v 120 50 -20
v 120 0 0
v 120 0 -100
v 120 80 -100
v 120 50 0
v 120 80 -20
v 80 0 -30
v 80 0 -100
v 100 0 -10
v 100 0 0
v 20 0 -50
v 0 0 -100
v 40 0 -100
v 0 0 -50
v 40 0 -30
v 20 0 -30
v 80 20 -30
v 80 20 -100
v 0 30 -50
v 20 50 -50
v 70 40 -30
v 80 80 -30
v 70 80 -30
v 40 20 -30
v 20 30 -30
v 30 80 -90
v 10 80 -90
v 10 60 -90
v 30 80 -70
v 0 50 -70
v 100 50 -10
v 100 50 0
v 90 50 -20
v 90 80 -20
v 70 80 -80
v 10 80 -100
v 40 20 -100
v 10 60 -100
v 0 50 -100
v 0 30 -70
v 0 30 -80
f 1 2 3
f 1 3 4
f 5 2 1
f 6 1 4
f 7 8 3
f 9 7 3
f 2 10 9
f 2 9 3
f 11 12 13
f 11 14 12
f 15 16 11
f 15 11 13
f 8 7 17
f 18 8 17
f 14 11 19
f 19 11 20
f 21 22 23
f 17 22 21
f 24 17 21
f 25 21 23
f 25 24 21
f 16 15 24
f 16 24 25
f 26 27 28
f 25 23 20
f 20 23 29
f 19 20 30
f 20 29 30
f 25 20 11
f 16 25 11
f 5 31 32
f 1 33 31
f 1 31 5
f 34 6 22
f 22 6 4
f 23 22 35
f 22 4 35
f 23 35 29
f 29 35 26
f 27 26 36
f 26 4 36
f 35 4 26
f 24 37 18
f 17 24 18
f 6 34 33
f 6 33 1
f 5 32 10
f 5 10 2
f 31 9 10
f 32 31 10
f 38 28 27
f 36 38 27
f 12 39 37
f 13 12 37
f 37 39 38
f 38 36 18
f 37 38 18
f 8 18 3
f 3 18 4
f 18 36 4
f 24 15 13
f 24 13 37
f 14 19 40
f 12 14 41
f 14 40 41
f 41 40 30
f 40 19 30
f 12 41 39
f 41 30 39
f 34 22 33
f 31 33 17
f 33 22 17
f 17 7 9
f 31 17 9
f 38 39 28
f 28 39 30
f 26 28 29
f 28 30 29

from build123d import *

# Parameters (mm, degrees)
SKETCH1_W                = 120
SKETCH1_H                = 80
BOSS_EXTRUDE1_DEPTH      = 100
SKETCH2_W                = 40
SKETCH2_H                = 20
CUT_EXTRUDE1_DEPTH       = 100
CUT_EXTRUDE2_DEPTH       = 100
SKETCH4_W                = 20
SKETCH4_H                = 50
CUT_EXTRUDE3_DEPTH       = 100
SKETCH5_W                = 60
SKETCH5_H                = 30
CUT_EXTRUDE4_DEPTH       = 100
CUT_EXTRUDE5_DEPTH       = 100
SKETCH7_W                = 30
SKETCH7_H                = 20
CUT_EXTRUDE6_DEPTH       = 30
CUT_EXTRUDE7_DEPTH       = 110
CUT_EXTRUDE8_DEPTH       = 110
CUT_EXTRUDE9_DEPTH       = 110
CUT_EXTRUDE11_DEPTH      = 110
CUT_EXTRUDE12_DEPTH      = 110
CUT_EXTRUDE13_DEPTH      = 110
BOSS_EXTRUDE4_DEPTH      = 50
BOSS_EXTRUDE6_DEPTH      = 40
BOSS_EXTRUDE7_DEPTH      = 40
CUT_EXTRUDE18_DEPTH      = 84
CUT_EXTRUDE18_DEPTH_BACK = 20
CUT_EXTRUDE19_DEPTH      = 20
SKETCH34_W               = 40
SKETCH34_H               = 50
BOSS_EXTRUDE8_DEPTH      = 30
SKETCH35_W               = 20
SKETCH35_H               = 14.142135624
CUT_EXTRUDE20_DEPTH      = 30
SKETCH36_W               = 20
SKETCH36_H               = 30
BOSS_EXTRUDE9_DEPTH      = 30
BOSS_EXTRUDE10_DEPTH     = 30
BOSS_EXTRUDE11_DEPTH     = 30
BOSS_EXTRUDE12_DEPTH     = 30
BOSS_EXTRUDE13_DEPTH     = 30
SKETCH41_W               = 40
SKETCH41_H               = 20
CUT_EXTRUDE21_DEPTH      = 172


with BuildPart() as part:
    # Sketch1 → Boss-Extrude1 (new body)
    with BuildSketch(Plane.XY):
        with Locations((60, 40)):
            Rectangle(SKETCH1_W, SKETCH1_H)
    extrude(amount=-BOSS_EXTRUDE1_DEPTH)

    # Sketch2 → Cut-Extrude1 (cut)
    with BuildSketch(Plane.XY):
        with Locations((60, 10)):
            Rectangle(SKETCH2_W, SKETCH2_H)
    extrude(amount=-CUT_EXTRUDE1_DEPTH, mode=Mode.SUBTRACT)

    # Sketch3 → Cut-Extrude2 (cut)
    with BuildSketch(Plane.XY):
        Polygon((0, 50), (10, 60), (10, 80), (0, 80), align=None)
    extrude(amount=-CUT_EXTRUDE2_DEPTH, mode=Mode.SUBTRACT)

    # Sketch4 → Cut-Extrude3 (cut)
    with BuildSketch(Plane(origin=(0, 0, 0), x_dir=(-1, 0, 0), z_dir=(0, -1, 0))):
        with Locations((-10, 25)):
            Rectangle(SKETCH4_W, SKETCH4_H)
    extrude(amount=-CUT_EXTRUDE3_DEPTH, mode=Mode.SUBTRACT)

    # Sketch5 → Cut-Extrude4 (cut)
    with BuildSketch(Plane(origin=(0, 0, 0), x_dir=(-1, 0, 0), z_dir=(0, -1, 0))):
        with Locations((-50, 15)):
            Rectangle(SKETCH5_W, SKETCH5_H)
    extrude(amount=-CUT_EXTRUDE4_DEPTH, mode=Mode.SUBTRACT)

    # Sketch6 → Cut-Extrude5 (cut)
    with BuildSketch(Plane.XZ):
        Polygon((80, -30), (100, -10), (100, 0), (80, 0), align=None)
    extrude(amount=-CUT_EXTRUDE5_DEPTH, mode=Mode.SUBTRACT)

    # Sketch7 → Cut-Extrude6 (cut)
    with BuildSketch(Plane(origin=(0, 80, 0), x_dir=(1, 0, 0), z_dir=(0, 1, 0))):
        with Locations((105, 10)):
            Rectangle(SKETCH7_W, SKETCH7_H)
    extrude(amount=-CUT_EXTRUDE6_DEPTH, mode=Mode.SUBTRACT)

    # Sketch9 → Cut-Extrude7 (cut)
    with BuildSketch(Plane.XY.offset(-90)):
        Polygon((10, 80), (10, 60), (30, 80), align=None)
    extrude(amount=CUT_EXTRUDE7_DEPTH, mode=Mode.SUBTRACT)

    # Sketch15 → Cut-Extrude8 (cut)
    with BuildSketch(Plane(origin=(6.578947368, -3.947368421, -2.631578947), x_dir=(0.278207442, -0.166924465, 0.945905303), z_dir=(-0.811107106, 0.486664263, 0.324442842))):
        Polygon((-71.221105162, 84.03430672), (-71.221105162, 25.724787771), (-50.077339567, 14.291548762), (-50.077339567, 53.164561394), align=None)
    extrude(amount=CUT_EXTRUDE8_DEPTH, mode=Mode.SUBTRACT)

    # Sketch18 → Cut-Extrude9 (cut)
    with BuildSketch(Plane(origin=(12.371134021, -10.309278351, -12.371134021), x_dir=(-0.468006318, 0.390005265, -0.793010706), z_dir=(0.609207699, -0.507673083, -0.609207699))):
        Polygon((72.670981065, 80.663234358), (22.230300111, 106.270610344), (22.230300111, 28.168113585), align=None)
    extrude(amount=-CUT_EXTRUDE9_DEPTH, mode=Mode.SUBTRACT)

    # Sketch19 → Cut-Extrude11 (cut)
    with BuildSketch(Plane(origin=(11.193675889, -9.328063241, -7.928853755), x_dir=(0.367189278, -0.305991065, 0.878374352), z_dir=(-0.674785869, 0.562321557, 0.477973324))):
        Polygon((-25.127266295, 106.270610344), (-70.665936585, 106.270610344), (-70.665936585, 23.046638388), (-25.127266295, 28.168113585), align=None)
    extrude(amount=CUT_EXTRUDE11_DEPTH, mode=Mode.SUBTRACT)

    # Sketch20 → Cut-Extrude12 (cut)
    with BuildSketch(Plane(origin=(18.330133634, 24.566158479, -3.023527197), x_dir=(0.803624389, -0.590679852, 0.072699059), z_dir=(0.595136826, 0.797606055, -0.098166899))):
        Polygon((-14.663450209, 46.256870976), (-22.809329684, 65.811114724), (-10.365705355, 46.571670512), align=None)
    extrude(amount=-CUT_EXTRUDE12_DEPTH, mode=Mode.SUBTRACT)

    # Sketch23 → Cut-Extrude13 (cut)
    with BuildSketch(Plane.XY.offset(-70)):
        Polygon((0, 30), (0, 80), (41.666666667, 80), align=None)
    extrude(amount=CUT_EXTRUDE13_DEPTH, mode=Mode.SUBTRACT)

    # Sketch27 → Boss-Extrude4 (add)
    with BuildSketch(Plane.XY.offset(-30)):
        Polygon((20, 20), (70, 80), (20, 30), align=None)
    extrude(amount=-BOSS_EXTRUDE4_DEPTH)

    # Sketch28 → Boss-Extrude6 (add)
    with BuildSketch(Plane(origin=(6.666666667, -6.666666667, -6.666666667), x_dir=(0.816496581, 0.40824829, 0.40824829), z_dir=(-0.577350269, 0.577350269, 0.577350269))):
        Polygon((28.577380332, 106.066017178), (77.567175188, 77.781745931), (16.329931619, 42.426406871), (-8.164965809, 84.852813742), align=None)
    extrude(amount=-BOSS_EXTRUDE6_DEPTH)

    # Sketch29 → Boss-Extrude7 (add)
    with BuildSketch(Plane(origin=(0, 80, 0), x_dir=(1, 0, 0), z_dir=(0, 1, 0))):
        Polygon((30, 70), (41.666666667, 70), (70, 30), align=None)
    extrude(amount=-BOSS_EXTRUDE7_DEPTH)

    # Sketch30 → Cut-Extrude18 (cut, two sides)
    with BuildSketch(Plane.XY.offset(-50)) as cut_extrude18_sk:
        Polygon((0, 0), (0, 30), (20, 50), (20, 0), align=None)
    extrude(amount=CUT_EXTRUDE18_DEPTH, mode=Mode.SUBTRACT)
    extrude(cut_extrude18_sk.sketch, amount=-CUT_EXTRUDE18_DEPTH_BACK, mode=Mode.SUBTRACT)

    # Sketch33 → Cut-Extrude19 (cut)
    with BuildSketch(Plane(origin=(11.193675889, -9.328063241, -7.928853755), x_dir=(0.367189278, -0.305991065, 0.878374352), z_dir=(-0.674785869, 0.562321557, 0.477973324))):
        Polygon((-70.665936585, 37.247092344), (-67.987191274, 37.130695181), (-70.665936585, 23.046638388), align=None)
    extrude(amount=-CUT_EXTRUDE19_DEPTH, mode=Mode.SUBTRACT)

    # Sketch34 → Boss-Extrude8 (add)
    with BuildSketch(Plane(origin=(0, 0, -100), x_dir=(-1, 0, 0), z_dir=(0, 0, -1))):
        with Locations((-20, 25)):
            Rectangle(SKETCH34_W, SKETCH34_H)
    extrude(amount=-BOSS_EXTRUDE8_DEPTH)

    # Sketch35 → Cut-Extrude20 (cut)
    with BuildSketch(Plane(origin=(-15, 15, 0), x_dir=(0, 0, -1), z_dir=(0.707106781, -0.707106781, 0))):
        with Locations((60, 42.426406871)):
            Rectangle(SKETCH35_W, SKETCH35_H)
    extrude(amount=-CUT_EXTRUDE20_DEPTH, mode=Mode.SUBTRACT)

    # Sketch36 → Boss-Extrude9 (add)
    with BuildSketch(Plane.ZY):
        with Locations((-60, 15)):
            Rectangle(SKETCH36_W, SKETCH36_H)
    extrude(amount=-BOSS_EXTRUDE9_DEPTH)

    # Sketch37 → Boss-Extrude10 (add)
    with BuildSketch(Plane.XY.offset(-50)):
        Polygon((0, 30), (20, 50), (20, 30), align=None)
    extrude(amount=-BOSS_EXTRUDE10_DEPTH)

    # Sketch38 → Boss-Extrude11 (add)
    with BuildSketch(Plane(origin=(6.666666667, -6.666666667, -6.666666667), x_dir=(0.816496581, 0.40824829, 0.40824829), z_dir=(-0.577350269, 0.577350269, 0.577350269))):
        Polygon((4.082482905, 91.923881554), (-8.164965809, 56.568542495), (16.329931619, 70.710678119), align=None)
    extrude(amount=-BOSS_EXTRUDE11_DEPTH)

    # Sketch39 → Boss-Extrude12 (add)
    with BuildSketch(Plane(origin=(6.666666667, -6.666666667, -6.666666667), x_dir=(0.816496581, 0.40824829, 0.40824829), z_dir=(-0.577350269, 0.577350269, 0.577350269))):
        Polygon((-8.164965809, 84.852813742), (4.082482905, 91.923881554), (-8.164965809, 56.568542495), align=None)
    extrude(amount=-BOSS_EXTRUDE12_DEPTH)

    # Sketch40 → Boss-Extrude13 (add)
    with BuildSketch(Plane.ZY):
        Polygon((-70, 30), (-70, 50), (-50, 30), align=None)
    extrude(amount=-BOSS_EXTRUDE13_DEPTH)

    # Sketch41 → Cut-Extrude21 (cut)
    with BuildSketch(Plane.XY.offset(-30)):
        with Locations((60, 10)):
            Rectangle(SKETCH41_W, SKETCH41_H)
    extrude(amount=-CUT_EXTRUDE21_DEPTH, mode=Mode.SUBTRACT)


solid = part.part
